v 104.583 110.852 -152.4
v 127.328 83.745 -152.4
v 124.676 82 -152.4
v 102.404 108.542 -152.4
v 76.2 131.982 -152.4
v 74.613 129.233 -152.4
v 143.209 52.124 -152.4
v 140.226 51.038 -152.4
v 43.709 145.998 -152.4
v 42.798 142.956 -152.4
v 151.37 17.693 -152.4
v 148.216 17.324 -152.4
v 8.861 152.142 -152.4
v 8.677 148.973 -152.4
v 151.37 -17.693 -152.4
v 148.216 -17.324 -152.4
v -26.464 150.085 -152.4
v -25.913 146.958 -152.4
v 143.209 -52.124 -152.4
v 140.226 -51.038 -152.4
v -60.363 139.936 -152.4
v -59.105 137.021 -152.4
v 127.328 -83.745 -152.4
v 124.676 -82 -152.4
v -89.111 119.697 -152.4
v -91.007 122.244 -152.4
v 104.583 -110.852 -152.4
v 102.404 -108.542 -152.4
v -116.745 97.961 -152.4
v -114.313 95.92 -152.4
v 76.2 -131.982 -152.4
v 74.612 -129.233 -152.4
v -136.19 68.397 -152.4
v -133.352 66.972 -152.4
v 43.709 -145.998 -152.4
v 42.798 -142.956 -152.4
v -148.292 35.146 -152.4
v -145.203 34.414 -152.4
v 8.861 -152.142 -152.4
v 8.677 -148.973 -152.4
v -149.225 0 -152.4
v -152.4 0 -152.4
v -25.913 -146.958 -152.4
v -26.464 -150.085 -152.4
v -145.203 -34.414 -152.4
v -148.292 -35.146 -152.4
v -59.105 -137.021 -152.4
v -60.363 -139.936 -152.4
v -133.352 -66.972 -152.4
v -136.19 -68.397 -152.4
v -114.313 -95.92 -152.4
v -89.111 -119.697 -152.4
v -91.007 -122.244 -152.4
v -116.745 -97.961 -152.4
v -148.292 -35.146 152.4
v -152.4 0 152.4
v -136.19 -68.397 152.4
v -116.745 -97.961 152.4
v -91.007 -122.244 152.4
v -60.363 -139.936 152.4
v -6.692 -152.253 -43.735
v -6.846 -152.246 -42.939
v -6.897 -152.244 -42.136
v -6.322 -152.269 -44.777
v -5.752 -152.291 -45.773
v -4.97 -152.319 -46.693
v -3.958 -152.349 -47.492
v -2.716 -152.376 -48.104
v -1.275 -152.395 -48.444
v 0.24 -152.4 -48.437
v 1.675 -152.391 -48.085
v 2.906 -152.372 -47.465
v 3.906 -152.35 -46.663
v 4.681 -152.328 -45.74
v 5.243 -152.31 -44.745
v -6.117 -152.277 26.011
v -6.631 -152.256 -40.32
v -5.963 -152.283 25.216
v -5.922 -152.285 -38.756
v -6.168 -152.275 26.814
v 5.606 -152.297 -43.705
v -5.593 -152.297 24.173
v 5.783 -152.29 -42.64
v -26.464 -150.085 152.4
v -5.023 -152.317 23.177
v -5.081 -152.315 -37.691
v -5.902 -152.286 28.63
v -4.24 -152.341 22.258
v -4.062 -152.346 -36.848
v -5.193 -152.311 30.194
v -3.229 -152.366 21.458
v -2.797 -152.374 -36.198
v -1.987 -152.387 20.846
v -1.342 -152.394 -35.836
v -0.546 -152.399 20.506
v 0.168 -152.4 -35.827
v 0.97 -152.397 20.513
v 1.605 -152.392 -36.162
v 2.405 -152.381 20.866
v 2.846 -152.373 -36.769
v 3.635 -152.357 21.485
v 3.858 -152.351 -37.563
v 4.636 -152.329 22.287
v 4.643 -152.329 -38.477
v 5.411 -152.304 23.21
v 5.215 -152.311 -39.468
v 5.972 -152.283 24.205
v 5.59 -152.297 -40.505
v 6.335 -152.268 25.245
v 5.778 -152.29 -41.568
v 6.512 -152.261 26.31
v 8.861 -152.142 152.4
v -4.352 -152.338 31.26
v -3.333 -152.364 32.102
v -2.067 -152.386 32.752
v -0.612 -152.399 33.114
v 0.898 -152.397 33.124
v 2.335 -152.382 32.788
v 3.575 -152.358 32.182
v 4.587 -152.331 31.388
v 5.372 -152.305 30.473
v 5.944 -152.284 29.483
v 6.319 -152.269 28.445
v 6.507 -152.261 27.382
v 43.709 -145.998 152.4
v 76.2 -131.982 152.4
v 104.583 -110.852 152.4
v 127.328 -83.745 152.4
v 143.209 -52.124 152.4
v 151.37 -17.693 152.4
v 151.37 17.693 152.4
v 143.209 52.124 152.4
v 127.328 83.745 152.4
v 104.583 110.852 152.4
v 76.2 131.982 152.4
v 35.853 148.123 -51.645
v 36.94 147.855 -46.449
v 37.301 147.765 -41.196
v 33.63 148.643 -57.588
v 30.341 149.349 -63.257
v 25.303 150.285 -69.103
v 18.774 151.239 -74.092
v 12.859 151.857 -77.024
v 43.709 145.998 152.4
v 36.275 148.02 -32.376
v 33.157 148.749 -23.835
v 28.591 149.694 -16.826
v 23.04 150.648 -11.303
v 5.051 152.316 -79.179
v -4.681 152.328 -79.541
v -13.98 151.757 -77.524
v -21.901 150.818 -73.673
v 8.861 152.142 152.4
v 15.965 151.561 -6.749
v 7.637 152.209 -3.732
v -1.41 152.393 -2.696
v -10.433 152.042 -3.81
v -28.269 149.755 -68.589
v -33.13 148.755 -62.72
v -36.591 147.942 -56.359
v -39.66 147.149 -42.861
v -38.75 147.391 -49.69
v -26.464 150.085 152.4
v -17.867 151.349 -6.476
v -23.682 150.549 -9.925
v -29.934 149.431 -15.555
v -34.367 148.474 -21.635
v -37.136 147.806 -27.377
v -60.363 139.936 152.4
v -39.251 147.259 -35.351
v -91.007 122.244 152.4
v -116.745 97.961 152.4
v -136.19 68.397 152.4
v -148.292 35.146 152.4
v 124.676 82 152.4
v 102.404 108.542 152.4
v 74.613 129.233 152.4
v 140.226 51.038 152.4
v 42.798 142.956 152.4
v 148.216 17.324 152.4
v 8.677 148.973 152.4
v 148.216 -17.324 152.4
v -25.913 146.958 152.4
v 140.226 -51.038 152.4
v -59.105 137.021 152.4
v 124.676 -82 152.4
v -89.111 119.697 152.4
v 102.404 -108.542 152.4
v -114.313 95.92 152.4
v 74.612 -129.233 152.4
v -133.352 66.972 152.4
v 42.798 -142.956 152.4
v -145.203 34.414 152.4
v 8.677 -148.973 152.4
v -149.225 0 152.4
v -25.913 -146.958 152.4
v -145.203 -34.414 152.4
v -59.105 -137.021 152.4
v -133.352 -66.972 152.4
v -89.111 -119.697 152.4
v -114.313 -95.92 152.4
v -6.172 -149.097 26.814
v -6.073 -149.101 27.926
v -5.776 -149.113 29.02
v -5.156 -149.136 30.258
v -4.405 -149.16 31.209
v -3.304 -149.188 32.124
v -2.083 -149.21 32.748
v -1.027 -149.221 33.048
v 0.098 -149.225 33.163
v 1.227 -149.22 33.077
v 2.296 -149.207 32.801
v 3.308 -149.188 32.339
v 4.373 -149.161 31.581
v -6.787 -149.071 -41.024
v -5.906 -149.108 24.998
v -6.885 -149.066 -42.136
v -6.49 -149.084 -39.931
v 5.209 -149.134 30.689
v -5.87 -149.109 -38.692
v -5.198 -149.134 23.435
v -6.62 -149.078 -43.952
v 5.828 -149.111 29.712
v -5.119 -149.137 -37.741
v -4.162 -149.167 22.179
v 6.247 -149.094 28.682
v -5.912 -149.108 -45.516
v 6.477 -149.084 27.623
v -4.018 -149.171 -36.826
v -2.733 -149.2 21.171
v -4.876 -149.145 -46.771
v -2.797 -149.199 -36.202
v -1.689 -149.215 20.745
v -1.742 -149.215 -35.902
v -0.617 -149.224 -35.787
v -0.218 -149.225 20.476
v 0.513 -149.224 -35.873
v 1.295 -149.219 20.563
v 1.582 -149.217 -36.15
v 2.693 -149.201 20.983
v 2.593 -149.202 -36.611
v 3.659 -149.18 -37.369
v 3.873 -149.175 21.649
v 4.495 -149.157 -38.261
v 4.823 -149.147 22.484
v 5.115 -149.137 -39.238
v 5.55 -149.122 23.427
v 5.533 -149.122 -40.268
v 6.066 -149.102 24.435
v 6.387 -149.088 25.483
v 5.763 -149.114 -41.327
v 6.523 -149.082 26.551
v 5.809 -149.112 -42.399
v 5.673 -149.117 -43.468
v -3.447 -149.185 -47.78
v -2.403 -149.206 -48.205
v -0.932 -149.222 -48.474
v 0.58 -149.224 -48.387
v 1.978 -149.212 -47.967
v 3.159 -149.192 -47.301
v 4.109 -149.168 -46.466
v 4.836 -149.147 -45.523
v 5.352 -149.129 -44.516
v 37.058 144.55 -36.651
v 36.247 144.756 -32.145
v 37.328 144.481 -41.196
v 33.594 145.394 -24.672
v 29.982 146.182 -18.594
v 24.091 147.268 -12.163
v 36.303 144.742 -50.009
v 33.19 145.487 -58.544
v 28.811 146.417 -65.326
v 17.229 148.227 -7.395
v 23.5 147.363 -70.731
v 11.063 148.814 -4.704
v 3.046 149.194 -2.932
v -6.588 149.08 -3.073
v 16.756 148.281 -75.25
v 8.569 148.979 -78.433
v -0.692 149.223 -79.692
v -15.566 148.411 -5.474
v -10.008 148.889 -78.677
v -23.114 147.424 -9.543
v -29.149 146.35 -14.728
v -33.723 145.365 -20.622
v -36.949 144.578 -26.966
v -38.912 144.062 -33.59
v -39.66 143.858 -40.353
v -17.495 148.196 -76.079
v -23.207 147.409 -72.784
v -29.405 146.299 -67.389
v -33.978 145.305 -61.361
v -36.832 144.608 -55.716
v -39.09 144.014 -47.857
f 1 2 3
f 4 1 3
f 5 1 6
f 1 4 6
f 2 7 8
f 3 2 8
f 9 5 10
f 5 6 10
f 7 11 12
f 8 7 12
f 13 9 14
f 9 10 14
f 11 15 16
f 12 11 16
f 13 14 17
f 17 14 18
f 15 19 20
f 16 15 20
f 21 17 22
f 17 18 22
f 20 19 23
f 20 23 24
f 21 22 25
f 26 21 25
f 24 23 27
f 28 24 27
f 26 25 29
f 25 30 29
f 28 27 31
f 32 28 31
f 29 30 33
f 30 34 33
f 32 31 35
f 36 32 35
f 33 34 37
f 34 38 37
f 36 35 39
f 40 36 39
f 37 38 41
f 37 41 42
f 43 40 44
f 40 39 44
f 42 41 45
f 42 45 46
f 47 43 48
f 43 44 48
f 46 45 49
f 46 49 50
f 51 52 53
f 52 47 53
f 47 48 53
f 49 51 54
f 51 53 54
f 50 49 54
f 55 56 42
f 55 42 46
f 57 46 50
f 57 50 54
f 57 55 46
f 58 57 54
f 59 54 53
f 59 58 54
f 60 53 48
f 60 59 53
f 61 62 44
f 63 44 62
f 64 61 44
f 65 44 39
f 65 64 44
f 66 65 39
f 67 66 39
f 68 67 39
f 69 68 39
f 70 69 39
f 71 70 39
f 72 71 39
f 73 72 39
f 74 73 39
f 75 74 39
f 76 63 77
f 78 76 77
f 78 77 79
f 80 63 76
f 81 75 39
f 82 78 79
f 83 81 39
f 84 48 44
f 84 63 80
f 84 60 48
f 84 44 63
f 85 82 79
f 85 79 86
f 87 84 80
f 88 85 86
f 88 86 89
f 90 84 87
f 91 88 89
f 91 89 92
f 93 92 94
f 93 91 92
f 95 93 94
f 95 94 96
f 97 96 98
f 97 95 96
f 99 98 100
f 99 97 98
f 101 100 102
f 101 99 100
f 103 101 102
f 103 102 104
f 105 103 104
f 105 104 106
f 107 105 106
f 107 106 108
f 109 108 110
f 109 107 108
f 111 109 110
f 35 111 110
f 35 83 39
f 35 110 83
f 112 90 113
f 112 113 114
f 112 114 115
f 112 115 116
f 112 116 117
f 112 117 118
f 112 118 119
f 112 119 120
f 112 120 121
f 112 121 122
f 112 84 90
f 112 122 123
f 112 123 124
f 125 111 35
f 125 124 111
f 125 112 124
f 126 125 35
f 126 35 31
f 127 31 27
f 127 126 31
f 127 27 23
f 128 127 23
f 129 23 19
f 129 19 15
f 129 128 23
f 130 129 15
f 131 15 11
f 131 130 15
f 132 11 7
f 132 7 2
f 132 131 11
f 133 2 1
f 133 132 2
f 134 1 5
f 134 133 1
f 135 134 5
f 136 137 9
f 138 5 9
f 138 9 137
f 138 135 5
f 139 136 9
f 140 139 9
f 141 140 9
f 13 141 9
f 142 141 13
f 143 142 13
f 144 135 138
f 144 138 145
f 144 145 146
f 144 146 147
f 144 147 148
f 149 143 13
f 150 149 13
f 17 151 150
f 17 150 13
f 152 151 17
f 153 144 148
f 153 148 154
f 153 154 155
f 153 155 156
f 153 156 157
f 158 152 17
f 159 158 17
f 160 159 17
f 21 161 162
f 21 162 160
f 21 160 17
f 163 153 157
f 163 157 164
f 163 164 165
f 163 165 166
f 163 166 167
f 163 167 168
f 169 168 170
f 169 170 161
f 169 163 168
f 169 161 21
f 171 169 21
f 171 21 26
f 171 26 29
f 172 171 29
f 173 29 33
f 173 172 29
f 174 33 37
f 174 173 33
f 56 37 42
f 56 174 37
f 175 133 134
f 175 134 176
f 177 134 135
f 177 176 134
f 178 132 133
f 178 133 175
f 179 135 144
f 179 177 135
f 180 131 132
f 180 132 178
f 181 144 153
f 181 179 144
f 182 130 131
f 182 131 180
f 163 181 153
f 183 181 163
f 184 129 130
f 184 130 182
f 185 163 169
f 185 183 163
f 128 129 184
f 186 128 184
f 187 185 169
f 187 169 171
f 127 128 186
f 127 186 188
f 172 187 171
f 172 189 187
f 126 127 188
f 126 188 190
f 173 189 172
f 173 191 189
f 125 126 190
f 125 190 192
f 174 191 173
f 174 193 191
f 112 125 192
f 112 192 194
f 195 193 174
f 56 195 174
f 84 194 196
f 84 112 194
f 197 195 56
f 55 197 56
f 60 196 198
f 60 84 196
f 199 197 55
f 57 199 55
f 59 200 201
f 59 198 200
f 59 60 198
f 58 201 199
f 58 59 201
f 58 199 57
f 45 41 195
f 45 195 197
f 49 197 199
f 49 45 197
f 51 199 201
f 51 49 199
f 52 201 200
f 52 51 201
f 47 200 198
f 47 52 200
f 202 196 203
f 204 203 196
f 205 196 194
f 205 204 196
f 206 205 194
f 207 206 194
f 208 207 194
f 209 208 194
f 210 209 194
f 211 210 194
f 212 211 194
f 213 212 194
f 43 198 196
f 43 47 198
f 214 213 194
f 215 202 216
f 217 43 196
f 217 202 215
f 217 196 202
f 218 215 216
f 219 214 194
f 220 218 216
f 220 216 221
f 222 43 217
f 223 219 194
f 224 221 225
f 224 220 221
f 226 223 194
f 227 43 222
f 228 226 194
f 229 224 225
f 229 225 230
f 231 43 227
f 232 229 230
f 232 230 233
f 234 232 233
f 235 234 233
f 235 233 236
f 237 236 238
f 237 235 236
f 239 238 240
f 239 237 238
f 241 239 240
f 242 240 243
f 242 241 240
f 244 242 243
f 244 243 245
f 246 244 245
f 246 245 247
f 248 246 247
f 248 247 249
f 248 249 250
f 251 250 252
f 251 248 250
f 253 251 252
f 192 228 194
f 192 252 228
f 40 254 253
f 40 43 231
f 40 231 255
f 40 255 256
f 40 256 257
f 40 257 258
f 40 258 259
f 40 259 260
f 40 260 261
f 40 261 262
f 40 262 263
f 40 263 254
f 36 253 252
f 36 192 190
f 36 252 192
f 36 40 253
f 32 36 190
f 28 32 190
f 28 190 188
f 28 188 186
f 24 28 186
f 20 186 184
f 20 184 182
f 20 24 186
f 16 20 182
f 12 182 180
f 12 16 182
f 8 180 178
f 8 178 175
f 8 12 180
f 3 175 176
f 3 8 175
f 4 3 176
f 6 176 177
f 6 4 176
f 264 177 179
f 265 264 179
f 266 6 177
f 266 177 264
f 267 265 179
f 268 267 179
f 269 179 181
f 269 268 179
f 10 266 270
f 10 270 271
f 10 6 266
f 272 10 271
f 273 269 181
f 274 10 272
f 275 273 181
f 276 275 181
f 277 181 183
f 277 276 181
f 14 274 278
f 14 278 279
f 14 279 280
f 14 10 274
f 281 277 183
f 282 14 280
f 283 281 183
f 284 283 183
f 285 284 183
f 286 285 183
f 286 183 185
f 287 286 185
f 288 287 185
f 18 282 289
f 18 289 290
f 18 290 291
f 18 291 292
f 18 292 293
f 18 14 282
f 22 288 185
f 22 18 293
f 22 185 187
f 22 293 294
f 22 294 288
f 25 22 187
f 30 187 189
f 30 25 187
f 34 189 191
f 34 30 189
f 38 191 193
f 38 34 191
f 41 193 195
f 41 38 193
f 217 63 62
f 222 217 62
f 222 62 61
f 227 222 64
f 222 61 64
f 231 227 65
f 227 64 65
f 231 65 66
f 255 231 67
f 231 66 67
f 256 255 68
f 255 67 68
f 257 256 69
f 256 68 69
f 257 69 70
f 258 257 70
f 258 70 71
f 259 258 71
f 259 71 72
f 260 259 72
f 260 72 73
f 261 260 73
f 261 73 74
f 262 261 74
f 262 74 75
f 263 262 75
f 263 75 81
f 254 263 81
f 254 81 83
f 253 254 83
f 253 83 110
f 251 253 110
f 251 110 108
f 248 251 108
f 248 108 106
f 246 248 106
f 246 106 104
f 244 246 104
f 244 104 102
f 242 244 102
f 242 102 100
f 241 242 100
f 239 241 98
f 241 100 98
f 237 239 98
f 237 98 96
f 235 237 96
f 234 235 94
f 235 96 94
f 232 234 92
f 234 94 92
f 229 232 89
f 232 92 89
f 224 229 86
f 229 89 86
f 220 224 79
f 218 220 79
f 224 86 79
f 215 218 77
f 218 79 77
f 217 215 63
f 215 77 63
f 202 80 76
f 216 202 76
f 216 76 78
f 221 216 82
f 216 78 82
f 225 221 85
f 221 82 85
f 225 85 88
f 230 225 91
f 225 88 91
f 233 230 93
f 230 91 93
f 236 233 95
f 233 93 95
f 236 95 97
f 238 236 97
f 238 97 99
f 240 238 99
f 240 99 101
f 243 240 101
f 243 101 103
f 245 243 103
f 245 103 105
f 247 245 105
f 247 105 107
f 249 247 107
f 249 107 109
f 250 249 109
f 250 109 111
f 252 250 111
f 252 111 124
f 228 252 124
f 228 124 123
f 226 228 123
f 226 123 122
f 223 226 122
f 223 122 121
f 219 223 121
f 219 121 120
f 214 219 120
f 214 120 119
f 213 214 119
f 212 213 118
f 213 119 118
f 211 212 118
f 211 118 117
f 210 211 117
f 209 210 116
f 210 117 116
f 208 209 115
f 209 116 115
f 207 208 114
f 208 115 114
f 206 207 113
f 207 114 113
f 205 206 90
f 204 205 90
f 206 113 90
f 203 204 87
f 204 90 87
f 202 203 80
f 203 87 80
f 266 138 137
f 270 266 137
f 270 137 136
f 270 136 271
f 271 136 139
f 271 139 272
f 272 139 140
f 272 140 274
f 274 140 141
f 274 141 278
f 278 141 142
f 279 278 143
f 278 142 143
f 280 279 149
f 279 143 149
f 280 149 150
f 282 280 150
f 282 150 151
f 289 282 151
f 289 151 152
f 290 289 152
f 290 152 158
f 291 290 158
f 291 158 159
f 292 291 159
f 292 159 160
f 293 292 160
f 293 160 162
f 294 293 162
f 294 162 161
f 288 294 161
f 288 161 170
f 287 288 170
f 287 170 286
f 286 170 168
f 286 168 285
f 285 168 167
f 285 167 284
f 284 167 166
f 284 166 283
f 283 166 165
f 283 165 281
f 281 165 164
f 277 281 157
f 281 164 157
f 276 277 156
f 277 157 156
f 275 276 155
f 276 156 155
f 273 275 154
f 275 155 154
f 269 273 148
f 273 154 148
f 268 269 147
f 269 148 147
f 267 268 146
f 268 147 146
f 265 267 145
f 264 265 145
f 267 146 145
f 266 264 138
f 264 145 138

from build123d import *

# Parameters (mm, degrees)
SKETCH3_R                                = 152.4
SKETCH3_R_2                              = 149.225
BOSS_EXTRUDE1_DEPTH                      = 152.4
F_1_0MM_DOWEL_HOLE1_REACH                = 394.408
F_1_0MM_DOWEL_HOLE1_BORE_R               = 38.5
F_1_2_0_5_DIAMETER_HOLE1_REACH           = 394.606
F_1_2_0_5_DIAMETER_HOLE1_BORE_R          = 6.35
F_1_2_0_5_DIAMETER_HOLE1_ON_FACE_2_REACH = 387.1
F_1_2_0_5_DIAMETER_HOLE1_BORE_2_R        = 6.35


with BuildPart() as part:
    # Sketch3 → Boss-Extrude1 (new, symmetric)
    with BuildSketch(Plane.XY):
        with Locations(Location((0, 0, 0), (0, 0, 180))):
            Circle(SKETCH3_R)
        with Locations(Location((0, 0, 0), (0, 0, 180))):
            Circle(SKETCH3_R_2, mode=Mode.SUBTRACT)
    extrude(amount=BOSS_EXTRUDE1_DEPTH, both=True)

    # Ø1.0mm Dowel Hole1 bore (on position points) → Ø1.0mm Dowel Hole1 (cut, up to next)
    with BuildSketch(Plane(origin=(-1.237560308, 152.394975129, -41.195571985), x_dir=(0.999967028404, 0.008120474463, 0), z_dir=(-0.008120474463, 0.999967028404, 0)), mode=Mode.PRIVATE) as f_1_0mm_dowel_hole1_sk1:
        Circle(F_1_0MM_DOWEL_HOLE1_BORE_R)
    f_1_0mm_dowel_hole1_tool1 = extrude(f_1_0mm_dowel_hole1_sk1.sketch, amount=-F_1_0MM_DOWEL_HOLE1_REACH, mode=Mode.PRIVATE) & part.part
    add(f_1_0mm_dowel_hole1_tool1.solids().sort_by_distance((-1.23756, 152.394975, -41.195572))[0], mode=Mode.SUBTRACT)

    # 1/2 (0.5) Diameter Hole1 bore (on position points) → 1/2 (0.5) Diameter Hole1 (cut, up to next)
    with BuildSketch(Plane(origin=(-0.547224497, -152.399017534, -42.136286286), x_dir=(-0.999993553373, 0.003590711924, 0), z_dir=(-0.003590711924, -0.999993553373, 0)), mode=Mode.PRIVATE) as f_1_2_0_5_diameter_hole1_sk1:
        Circle(F_1_2_0_5_DIAMETER_HOLE1_BORE_R)
    f_1_2_0_5_diameter_hole1_tool1 = extrude(f_1_2_0_5_diameter_hole1_sk1.sketch, amount=-F_1_2_0_5_DIAMETER_HOLE1_REACH, mode=Mode.PRIVATE) & part.part
    add(f_1_2_0_5_diameter_hole1_tool1.solids().sort_by_distance((-0.547224, -152.399018, -42.136286))[0], mode=Mode.SUBTRACT)

    # 1/2 (0.5) Diameter Hole1 bore 2 (on position points) → 1/2 (0.5) Diameter Hole1 on face 2 (cut, up to next)
    with BuildSketch(Plane(origin=(0.182408166, -152.399890837, 26.814000364), x_dir=(-0.999999283595, -0.001197000339, 0), z_dir=(0.001197000339, -0.999999283595, 0)), mode=Mode.PRIVATE) as f_1_2_0_5_diameter_hole1_on_face_2_sk1:
        Circle(F_1_2_0_5_DIAMETER_HOLE1_BORE_2_R)
    f_1_2_0_5_diameter_hole1_on_face_2_tool1 = extrude(f_1_2_0_5_diameter_hole1_on_face_2_sk1.sketch, amount=-F_1_2_0_5_DIAMETER_HOLE1_ON_FACE_2_REACH, mode=Mode.PRIVATE) & part.part
    add(f_1_2_0_5_diameter_hole1_on_face_2_tool1.solids().sort_by_distance((0.182408, -152.399891, 26.814))[0], mode=Mode.SUBTRACT)


solid = part.part
